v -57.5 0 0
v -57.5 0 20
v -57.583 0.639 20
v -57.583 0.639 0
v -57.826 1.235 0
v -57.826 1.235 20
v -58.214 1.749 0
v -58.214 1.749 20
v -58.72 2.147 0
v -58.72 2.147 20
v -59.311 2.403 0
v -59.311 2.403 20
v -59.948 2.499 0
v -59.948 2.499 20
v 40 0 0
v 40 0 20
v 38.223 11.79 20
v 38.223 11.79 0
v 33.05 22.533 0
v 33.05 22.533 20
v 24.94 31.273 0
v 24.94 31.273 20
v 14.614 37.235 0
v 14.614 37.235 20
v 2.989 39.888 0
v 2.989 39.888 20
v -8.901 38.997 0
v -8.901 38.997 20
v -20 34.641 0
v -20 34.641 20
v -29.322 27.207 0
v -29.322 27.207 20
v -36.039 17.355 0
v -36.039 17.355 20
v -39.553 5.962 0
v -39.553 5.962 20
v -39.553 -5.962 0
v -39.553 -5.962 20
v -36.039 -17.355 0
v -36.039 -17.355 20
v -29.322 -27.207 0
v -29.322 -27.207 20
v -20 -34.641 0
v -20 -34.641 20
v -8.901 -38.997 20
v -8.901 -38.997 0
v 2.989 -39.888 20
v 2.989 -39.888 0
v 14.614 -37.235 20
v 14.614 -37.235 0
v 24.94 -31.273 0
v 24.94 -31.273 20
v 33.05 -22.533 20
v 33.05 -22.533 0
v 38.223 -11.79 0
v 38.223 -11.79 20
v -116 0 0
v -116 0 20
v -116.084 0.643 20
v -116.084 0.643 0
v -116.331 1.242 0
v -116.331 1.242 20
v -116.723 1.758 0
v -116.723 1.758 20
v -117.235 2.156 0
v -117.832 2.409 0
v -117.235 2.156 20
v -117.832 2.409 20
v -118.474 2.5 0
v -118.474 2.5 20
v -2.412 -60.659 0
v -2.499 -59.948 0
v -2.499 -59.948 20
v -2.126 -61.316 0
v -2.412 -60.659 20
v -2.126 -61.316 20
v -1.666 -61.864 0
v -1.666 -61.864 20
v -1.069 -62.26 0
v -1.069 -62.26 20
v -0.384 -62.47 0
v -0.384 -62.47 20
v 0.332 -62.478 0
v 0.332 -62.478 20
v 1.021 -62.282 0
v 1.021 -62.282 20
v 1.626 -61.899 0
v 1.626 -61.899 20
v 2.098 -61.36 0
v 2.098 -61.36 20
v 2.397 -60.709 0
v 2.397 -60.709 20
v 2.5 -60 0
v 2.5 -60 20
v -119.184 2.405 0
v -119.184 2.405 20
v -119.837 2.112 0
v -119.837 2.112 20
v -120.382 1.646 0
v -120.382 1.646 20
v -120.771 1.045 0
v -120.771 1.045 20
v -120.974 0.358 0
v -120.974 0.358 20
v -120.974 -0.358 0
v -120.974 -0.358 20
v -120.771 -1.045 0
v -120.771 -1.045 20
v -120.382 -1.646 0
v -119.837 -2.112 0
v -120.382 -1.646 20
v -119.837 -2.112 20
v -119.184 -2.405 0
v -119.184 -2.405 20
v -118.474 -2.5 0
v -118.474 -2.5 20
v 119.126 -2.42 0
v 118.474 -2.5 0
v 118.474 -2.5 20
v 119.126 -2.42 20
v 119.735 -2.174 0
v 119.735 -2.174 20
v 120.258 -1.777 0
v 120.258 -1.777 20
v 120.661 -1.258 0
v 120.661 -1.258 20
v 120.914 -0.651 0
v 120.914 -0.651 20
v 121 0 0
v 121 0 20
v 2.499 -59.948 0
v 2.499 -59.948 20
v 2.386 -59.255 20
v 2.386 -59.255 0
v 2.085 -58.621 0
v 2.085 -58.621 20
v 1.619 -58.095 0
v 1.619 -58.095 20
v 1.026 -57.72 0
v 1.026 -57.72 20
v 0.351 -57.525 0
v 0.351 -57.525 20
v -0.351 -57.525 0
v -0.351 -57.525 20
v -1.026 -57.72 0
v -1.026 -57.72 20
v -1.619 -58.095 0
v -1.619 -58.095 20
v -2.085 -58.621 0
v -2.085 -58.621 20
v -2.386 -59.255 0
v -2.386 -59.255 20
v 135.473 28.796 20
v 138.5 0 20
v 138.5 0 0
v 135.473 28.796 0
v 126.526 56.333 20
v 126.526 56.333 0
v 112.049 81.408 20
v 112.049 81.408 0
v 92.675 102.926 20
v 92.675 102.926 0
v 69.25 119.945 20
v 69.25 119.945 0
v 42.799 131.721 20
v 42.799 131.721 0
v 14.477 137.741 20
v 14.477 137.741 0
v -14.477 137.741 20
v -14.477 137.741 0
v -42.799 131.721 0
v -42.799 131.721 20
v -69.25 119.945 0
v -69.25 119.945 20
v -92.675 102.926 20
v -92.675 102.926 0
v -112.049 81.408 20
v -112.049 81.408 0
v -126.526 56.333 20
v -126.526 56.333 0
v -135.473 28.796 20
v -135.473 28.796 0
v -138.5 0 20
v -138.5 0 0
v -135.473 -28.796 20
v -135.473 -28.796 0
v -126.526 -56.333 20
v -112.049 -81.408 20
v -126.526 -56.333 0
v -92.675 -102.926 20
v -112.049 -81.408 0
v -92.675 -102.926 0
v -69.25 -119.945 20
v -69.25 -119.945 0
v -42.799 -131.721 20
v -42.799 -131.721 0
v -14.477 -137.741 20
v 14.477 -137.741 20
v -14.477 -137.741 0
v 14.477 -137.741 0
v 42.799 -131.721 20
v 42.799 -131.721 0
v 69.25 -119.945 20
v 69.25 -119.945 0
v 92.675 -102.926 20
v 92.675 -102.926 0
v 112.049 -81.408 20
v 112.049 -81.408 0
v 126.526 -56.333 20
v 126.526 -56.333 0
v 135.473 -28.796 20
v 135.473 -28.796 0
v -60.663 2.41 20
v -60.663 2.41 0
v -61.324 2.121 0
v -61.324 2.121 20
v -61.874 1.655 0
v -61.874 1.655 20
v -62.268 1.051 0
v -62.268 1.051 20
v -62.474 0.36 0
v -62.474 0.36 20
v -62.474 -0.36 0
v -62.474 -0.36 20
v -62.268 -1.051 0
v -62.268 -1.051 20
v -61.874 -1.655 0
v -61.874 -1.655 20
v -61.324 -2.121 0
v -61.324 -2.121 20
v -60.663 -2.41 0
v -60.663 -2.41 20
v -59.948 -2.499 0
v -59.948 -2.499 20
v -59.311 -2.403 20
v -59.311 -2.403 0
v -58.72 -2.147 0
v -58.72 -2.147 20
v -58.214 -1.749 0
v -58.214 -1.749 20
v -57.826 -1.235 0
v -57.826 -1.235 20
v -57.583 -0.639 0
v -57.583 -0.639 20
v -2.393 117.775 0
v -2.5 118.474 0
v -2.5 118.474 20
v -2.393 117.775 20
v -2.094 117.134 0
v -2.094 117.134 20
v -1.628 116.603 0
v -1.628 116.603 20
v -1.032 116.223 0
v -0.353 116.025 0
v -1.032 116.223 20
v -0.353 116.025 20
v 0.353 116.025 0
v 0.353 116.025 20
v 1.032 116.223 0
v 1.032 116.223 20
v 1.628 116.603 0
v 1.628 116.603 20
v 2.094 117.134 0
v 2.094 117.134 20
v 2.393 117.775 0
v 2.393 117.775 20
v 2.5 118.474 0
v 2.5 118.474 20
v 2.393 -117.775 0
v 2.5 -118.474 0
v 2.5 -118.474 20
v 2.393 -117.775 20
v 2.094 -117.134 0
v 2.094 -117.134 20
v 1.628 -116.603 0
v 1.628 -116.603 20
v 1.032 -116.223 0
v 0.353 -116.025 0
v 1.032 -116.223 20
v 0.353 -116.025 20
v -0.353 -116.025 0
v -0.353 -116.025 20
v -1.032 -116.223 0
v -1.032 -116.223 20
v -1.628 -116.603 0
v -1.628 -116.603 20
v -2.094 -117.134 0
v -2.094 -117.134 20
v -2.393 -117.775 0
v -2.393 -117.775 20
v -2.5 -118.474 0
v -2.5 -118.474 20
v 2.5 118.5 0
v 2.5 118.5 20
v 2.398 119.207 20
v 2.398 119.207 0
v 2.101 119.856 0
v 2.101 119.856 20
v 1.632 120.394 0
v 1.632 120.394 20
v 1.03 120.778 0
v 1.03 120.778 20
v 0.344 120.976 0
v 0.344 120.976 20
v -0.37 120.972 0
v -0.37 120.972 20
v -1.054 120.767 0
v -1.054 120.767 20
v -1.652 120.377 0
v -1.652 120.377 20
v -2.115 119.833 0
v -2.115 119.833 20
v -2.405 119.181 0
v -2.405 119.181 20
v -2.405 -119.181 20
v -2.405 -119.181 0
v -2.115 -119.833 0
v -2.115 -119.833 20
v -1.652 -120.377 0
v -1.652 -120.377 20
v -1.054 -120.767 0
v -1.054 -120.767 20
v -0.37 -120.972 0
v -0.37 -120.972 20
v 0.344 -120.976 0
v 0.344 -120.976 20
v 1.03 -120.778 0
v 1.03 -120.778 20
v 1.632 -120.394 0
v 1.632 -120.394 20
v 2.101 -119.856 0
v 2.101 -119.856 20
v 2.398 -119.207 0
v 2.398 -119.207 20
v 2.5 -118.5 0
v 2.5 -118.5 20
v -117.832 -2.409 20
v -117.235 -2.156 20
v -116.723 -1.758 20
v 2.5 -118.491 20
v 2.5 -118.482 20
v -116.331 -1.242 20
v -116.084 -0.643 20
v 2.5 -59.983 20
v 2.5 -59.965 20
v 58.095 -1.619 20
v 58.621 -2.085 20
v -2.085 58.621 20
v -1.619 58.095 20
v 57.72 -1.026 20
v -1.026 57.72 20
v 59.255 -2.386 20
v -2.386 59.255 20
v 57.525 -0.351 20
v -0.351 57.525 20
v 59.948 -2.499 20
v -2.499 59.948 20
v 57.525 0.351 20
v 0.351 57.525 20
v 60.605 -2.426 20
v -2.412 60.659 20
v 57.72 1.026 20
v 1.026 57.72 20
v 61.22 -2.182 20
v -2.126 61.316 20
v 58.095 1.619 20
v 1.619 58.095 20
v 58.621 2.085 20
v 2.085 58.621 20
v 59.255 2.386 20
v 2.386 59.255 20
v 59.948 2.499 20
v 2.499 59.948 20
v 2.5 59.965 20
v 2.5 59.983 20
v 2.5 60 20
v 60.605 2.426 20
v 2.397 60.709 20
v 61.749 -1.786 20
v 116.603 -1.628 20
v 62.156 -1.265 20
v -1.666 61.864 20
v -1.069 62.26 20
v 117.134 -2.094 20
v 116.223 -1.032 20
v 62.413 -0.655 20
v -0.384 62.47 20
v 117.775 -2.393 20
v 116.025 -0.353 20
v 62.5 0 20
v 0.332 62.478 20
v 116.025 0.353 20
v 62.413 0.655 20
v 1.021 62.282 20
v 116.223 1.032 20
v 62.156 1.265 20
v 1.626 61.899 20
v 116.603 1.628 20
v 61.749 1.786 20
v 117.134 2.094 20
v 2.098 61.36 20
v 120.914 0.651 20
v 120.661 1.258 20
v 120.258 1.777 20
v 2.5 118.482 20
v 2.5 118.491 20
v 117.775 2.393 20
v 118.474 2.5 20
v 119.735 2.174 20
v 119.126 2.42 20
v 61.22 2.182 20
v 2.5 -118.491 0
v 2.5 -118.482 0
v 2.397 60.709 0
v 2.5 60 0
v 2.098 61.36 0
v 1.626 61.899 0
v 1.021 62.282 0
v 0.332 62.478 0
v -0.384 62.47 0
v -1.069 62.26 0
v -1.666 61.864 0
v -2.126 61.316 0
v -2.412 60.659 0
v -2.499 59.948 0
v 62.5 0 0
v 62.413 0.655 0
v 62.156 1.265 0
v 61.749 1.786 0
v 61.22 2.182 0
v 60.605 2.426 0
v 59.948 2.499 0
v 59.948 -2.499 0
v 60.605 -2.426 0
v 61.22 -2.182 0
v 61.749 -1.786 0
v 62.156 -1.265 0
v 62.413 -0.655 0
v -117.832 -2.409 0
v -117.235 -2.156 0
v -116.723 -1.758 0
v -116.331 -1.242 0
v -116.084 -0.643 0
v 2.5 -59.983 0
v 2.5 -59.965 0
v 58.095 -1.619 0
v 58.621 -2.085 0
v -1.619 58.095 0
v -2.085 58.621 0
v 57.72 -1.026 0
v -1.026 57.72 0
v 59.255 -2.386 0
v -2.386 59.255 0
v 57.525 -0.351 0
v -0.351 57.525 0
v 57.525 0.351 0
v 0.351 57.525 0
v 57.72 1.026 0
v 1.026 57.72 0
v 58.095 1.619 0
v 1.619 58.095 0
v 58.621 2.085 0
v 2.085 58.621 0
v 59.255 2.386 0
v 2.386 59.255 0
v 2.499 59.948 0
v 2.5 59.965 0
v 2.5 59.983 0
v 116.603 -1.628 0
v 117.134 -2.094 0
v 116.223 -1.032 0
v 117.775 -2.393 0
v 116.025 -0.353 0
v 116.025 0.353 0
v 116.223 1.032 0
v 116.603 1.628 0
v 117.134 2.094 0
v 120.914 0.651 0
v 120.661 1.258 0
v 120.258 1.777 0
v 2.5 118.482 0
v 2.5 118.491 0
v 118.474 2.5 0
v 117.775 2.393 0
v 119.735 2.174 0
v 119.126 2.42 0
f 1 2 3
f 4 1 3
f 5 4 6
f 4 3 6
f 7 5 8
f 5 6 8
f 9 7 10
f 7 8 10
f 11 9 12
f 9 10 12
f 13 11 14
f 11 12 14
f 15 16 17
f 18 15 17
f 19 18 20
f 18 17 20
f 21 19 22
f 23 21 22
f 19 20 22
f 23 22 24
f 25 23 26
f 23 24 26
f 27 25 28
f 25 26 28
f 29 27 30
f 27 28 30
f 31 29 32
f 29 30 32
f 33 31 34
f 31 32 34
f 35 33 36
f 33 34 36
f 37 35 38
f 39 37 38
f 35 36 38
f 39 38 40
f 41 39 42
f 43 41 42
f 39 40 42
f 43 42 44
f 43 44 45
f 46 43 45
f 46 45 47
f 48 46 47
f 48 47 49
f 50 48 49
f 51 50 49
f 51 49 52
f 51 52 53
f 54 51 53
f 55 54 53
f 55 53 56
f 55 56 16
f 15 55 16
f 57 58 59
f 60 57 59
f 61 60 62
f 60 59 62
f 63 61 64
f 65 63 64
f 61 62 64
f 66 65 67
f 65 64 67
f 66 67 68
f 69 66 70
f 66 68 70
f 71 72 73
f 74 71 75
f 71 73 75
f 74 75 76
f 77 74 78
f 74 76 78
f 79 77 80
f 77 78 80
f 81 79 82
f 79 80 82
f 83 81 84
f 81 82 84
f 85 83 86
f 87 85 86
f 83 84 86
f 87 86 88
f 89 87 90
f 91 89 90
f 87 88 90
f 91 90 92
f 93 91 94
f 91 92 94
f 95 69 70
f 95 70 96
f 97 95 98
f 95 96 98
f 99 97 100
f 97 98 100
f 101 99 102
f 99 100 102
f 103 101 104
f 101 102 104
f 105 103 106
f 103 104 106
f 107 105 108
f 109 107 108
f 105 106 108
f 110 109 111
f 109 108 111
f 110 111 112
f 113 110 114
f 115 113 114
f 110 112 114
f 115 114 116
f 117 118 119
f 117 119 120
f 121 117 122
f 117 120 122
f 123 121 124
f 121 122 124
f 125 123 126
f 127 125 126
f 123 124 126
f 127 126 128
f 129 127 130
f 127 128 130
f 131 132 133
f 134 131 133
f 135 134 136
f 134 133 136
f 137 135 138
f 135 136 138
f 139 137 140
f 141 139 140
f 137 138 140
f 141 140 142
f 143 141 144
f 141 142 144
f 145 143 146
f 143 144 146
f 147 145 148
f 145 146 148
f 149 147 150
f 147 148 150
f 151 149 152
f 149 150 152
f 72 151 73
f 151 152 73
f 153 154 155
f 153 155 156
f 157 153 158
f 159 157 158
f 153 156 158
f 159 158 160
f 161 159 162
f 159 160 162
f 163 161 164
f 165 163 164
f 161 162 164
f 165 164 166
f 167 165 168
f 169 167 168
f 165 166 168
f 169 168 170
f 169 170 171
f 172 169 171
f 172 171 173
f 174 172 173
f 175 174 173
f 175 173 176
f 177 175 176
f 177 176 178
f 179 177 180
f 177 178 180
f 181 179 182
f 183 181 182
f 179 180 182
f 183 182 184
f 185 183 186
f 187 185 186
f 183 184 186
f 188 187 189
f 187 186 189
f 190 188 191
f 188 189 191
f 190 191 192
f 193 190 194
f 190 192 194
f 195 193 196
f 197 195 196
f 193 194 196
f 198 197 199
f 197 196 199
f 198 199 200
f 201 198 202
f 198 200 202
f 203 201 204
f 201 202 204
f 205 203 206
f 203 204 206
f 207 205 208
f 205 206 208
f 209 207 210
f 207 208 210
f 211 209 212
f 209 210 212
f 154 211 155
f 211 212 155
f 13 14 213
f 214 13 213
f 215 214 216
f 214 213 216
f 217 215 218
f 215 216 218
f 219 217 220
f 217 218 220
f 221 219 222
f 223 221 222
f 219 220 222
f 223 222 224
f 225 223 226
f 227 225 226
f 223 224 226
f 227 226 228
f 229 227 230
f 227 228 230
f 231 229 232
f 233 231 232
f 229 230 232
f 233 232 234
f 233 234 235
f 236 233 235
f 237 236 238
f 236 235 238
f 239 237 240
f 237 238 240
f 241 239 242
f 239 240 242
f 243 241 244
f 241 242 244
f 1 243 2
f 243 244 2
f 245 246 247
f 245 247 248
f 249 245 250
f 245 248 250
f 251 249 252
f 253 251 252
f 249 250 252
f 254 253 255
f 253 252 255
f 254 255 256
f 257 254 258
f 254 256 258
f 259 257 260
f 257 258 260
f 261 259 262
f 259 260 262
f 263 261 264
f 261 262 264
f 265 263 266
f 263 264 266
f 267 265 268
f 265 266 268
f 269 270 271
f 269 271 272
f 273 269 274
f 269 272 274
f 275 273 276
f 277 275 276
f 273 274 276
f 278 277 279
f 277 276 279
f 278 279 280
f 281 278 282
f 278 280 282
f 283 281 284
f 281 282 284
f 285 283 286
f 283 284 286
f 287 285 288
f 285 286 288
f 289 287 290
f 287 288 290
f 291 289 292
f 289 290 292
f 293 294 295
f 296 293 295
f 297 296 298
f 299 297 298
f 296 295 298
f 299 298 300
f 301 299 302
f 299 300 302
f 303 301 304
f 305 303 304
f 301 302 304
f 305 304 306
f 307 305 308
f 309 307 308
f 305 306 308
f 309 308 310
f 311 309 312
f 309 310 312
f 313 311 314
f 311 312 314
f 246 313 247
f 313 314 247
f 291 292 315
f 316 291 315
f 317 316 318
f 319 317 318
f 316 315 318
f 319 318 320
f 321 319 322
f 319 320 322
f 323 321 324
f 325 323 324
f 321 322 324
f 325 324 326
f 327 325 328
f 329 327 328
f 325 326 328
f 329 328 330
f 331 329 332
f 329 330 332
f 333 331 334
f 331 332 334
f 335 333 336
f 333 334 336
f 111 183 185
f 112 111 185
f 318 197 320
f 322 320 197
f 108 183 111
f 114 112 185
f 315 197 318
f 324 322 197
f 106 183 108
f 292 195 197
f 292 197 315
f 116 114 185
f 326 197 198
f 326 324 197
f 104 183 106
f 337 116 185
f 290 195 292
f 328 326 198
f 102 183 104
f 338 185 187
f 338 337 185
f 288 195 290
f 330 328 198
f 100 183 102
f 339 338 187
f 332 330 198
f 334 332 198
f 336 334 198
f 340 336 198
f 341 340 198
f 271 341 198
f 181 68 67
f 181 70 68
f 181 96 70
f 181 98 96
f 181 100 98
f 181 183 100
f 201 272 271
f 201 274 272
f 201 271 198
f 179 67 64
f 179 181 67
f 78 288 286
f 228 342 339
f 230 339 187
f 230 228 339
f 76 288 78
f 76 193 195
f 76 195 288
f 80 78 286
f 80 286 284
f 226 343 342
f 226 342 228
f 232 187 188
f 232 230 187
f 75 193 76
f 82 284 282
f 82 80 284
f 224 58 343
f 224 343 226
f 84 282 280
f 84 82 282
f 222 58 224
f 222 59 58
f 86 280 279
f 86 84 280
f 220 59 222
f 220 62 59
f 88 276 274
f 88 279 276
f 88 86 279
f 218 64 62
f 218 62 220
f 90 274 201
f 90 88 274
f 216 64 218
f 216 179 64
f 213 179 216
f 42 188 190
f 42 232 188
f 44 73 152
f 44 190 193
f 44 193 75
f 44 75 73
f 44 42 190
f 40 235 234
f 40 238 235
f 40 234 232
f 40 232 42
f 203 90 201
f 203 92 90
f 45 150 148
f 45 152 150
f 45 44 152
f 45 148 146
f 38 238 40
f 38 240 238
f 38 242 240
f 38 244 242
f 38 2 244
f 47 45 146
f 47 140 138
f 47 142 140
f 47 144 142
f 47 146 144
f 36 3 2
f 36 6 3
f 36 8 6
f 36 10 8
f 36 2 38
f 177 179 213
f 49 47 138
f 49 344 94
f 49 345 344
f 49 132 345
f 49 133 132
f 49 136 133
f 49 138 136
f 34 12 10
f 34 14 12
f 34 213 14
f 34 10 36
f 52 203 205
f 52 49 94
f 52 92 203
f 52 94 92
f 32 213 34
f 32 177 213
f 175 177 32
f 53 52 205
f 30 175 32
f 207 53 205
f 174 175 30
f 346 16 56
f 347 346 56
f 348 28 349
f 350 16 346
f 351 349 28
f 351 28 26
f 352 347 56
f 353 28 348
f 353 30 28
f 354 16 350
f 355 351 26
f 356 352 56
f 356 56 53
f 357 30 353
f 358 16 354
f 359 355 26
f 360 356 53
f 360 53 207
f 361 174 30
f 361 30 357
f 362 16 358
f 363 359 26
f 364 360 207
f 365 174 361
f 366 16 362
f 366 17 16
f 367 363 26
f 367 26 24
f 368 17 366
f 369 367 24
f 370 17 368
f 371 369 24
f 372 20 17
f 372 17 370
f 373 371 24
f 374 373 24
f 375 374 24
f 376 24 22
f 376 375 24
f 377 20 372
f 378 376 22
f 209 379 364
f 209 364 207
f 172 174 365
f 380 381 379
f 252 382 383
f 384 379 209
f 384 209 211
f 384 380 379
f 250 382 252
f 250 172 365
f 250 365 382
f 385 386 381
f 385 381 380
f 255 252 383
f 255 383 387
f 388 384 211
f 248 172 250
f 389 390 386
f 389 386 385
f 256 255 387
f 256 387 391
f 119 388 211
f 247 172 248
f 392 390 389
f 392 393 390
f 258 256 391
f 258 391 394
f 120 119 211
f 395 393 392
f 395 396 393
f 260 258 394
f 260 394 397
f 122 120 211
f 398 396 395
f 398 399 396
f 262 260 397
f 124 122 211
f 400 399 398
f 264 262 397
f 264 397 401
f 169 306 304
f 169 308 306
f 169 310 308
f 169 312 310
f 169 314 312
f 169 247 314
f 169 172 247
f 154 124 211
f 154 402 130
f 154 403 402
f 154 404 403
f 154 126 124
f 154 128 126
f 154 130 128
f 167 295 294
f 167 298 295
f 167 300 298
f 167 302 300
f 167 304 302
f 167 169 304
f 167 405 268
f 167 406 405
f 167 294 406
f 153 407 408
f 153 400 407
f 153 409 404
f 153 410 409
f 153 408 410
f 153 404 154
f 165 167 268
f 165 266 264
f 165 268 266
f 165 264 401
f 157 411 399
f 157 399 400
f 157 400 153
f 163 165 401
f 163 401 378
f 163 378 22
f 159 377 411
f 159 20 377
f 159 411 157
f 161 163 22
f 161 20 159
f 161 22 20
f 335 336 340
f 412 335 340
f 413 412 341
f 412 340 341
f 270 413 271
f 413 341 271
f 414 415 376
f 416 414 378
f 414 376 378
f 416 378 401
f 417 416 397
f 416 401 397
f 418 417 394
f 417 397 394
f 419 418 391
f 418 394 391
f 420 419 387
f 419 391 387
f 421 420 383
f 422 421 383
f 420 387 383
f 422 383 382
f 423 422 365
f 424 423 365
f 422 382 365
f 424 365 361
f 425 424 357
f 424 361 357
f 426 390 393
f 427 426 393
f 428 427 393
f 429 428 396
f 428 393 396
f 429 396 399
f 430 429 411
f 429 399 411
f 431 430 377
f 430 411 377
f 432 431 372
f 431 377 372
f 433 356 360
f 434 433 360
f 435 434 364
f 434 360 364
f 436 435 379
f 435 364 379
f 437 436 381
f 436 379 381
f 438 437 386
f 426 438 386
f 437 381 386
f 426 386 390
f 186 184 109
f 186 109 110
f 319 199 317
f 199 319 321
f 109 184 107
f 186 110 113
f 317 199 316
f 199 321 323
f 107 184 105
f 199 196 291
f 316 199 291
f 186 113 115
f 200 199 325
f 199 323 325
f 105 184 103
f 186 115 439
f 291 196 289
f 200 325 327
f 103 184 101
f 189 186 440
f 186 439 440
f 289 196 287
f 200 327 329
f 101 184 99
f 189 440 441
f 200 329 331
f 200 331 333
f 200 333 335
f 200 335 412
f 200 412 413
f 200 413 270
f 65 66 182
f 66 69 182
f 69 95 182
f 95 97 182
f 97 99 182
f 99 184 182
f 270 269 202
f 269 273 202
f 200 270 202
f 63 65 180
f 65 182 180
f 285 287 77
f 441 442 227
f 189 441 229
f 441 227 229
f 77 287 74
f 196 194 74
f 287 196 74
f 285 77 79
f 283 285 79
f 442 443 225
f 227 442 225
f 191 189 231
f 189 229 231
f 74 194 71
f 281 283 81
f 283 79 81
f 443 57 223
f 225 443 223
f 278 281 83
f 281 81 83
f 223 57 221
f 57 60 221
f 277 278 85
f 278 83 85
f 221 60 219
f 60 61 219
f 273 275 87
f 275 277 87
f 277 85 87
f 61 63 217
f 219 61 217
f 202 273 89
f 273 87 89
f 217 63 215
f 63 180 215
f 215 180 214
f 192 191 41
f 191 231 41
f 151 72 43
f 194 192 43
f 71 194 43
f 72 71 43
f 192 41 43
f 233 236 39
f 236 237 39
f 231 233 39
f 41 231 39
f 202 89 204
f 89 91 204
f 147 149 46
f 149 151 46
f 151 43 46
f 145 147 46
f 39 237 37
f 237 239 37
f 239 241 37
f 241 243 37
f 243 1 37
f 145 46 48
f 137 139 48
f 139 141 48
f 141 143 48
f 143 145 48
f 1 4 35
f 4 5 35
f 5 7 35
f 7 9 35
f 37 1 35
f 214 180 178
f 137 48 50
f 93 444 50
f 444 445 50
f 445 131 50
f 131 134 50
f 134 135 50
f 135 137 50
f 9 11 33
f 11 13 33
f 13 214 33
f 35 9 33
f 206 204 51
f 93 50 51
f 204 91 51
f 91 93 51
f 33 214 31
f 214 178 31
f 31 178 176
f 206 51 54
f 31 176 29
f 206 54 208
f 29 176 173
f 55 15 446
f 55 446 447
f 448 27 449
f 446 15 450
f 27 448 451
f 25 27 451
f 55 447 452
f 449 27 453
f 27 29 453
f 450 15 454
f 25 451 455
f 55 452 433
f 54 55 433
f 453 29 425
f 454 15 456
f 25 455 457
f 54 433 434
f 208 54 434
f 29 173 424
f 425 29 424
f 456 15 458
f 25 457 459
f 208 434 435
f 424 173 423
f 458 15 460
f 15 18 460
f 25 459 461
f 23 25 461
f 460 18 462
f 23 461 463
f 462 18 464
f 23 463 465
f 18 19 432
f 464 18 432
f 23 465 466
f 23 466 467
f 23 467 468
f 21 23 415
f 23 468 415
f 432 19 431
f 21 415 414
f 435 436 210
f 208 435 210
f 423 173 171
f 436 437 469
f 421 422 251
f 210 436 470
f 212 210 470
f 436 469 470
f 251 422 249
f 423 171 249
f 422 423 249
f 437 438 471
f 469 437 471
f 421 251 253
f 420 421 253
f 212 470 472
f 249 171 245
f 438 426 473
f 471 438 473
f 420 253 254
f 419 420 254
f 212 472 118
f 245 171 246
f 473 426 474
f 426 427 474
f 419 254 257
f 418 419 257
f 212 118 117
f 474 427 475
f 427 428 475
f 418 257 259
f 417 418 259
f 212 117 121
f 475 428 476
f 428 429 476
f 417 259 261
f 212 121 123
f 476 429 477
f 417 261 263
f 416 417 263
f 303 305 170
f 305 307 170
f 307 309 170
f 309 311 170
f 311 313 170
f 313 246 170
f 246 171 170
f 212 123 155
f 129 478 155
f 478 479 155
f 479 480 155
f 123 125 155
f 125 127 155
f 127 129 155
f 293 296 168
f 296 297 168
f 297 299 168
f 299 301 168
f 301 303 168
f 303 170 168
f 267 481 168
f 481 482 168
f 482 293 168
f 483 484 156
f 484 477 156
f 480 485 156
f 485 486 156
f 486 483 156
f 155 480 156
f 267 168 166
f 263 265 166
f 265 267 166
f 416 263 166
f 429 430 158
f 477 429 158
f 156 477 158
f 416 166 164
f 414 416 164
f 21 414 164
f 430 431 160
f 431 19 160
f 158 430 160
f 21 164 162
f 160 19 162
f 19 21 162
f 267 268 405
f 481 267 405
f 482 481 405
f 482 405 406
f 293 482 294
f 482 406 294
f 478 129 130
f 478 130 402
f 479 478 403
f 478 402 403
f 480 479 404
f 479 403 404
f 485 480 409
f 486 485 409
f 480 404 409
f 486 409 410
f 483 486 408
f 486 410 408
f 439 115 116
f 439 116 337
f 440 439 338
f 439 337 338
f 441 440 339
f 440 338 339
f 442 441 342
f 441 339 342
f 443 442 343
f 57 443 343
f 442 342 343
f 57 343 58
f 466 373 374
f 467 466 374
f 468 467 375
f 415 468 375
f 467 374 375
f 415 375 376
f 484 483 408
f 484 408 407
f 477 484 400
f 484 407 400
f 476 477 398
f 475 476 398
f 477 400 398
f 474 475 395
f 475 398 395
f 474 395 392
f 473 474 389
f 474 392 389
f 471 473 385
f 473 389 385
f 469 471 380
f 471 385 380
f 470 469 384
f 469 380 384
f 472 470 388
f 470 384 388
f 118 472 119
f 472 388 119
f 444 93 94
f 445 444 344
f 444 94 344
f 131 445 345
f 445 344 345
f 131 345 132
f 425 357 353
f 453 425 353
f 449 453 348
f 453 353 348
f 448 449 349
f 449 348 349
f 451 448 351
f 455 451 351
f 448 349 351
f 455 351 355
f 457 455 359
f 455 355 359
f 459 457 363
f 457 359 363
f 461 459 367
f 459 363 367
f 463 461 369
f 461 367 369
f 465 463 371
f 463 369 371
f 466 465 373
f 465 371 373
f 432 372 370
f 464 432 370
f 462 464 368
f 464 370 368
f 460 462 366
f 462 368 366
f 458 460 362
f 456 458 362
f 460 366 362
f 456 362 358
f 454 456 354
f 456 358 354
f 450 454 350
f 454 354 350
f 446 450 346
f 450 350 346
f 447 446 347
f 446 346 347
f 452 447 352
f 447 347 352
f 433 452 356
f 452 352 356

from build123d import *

# Parameters (mm, degrees)
F0_R     = 138.5
F1_DEPTH = 20
F2_R     = 40
F3_DEPTH = 25
F5_DEPTH = 25
F7_DEPTH = 20.001


with BuildPart() as f1:
    # F0 (on Top) → F1 (new body)
    with BuildSketch(Plane.XY):
        Circle(F0_R)
    extrude(amount=F1_DEPTH)

    # F2 (on face) → F3 (cut)
    with BuildSketch(Plane.XY.offset(20)):
        Circle(F2_R)
    extrude(amount=-F3_DEPTH, mode=Mode.SUBTRACT)

    # F4 (on face) → F5 (cut)
    with BuildSketch(Plane.XY.offset(20)):
        with BuildLine():
            ThreePointArc((-2.4994574064, 59.9479166667), (0, 60), (2.4994574064, 59.9479166667))
            ThreePointArc((2.4994574064, 59.9479166667), (2.4998643479, 59.9739569202), (2.5, 60))
            ThreePointArc((2.5, 60), (-0.0260430798, 62.4998643479), (-2.4994574064, 59.9479166667))
        make_face()
        with BuildLine():
            ThreePointArc((-2.4994574064, 59.9479166667), (0, 57.5), (2.4994574064, 59.9479166667))
            ThreePointArc((2.4994574064, 59.9479166667), (0, 60), (-2.4994574064, 59.9479166667))
        make_face()
        with BuildLine():
            ThreePointArc((-57.5, 0), (-58.2139137292, 1.7492557941), (-59.9479166667, 2.4994574064))
            ThreePointArc((-59.9479166667, 2.4994574064), (-60, 0), (-59.9479166667, -2.4994574064))
            ThreePointArc((-59.9479166667, -2.4994574064), (-58.2139137292, -1.7492557941), (-57.5, 0))
        make_face()
        with BuildLine():
            ThreePointArc((-59.9479166667, -2.4994574064), (-60, 0), (-59.9479166667, 2.4994574064))
            ThreePointArc((-59.9479166667, 2.4994574064), (-62.5, 0), (-59.9479166667, -2.4994574064))
        make_face()
        with BuildLine():
            ThreePointArc((59.9479166667, 2.4994574064), (59.9869777535, 1.25), (60, 0))
            ThreePointArc((60, 0), (59.9869777535, -1.25), (59.9479166667, -2.4994574064))
            ThreePointArc((59.9479166667, -2.4994574064), (61.7492557941, -1.7860862708), (62.5, 0))
            ThreePointArc((62.5, 0), (61.7492557941, 1.7860862708), (59.9479166667, 2.4994574064))
        make_face()
        with BuildLine():
            ThreePointArc((59.9479166667, -2.4994574064), (59.9869777535, -1.25), (60, 0))
            ThreePointArc((60, 0), (59.9869777535, 1.25), (59.9479166667, 2.4994574064))
            ThreePointArc((59.9479166667, 2.4994574064), (57.5, 0), (59.9479166667, -2.4994574064))
        make_face()
        with BuildLine():
            ThreePointArc((2.5, -60), (2.4998643479, -59.9739569202), (2.4994574064, -59.9479166667))
            ThreePointArc((2.4994574064, -59.9479166667), (0, -60), (-2.4994574064, -59.9479166667))
            ThreePointArc((-2.4994574064, -59.9479166667), (-0.0260430798, -62.4998643479), (2.5, -60))
        make_face()
        with BuildLine():
            ThreePointArc((-2.4994574064, -59.9479166667), (0, -60), (2.4994574064, -59.9479166667))
            ThreePointArc((2.4994574064, -59.9479166667), (0, -57.5), (-2.4994574064, -59.9479166667))
        make_face()
    extrude(amount=-F5_DEPTH, mode=Mode.SUBTRACT)

    # F6 (on face) → F7 (cut, through all)
    with BuildSketch(Plane.XY.offset(20)):
        with BuildLine():
            ThreePointArc((-2.499860907, 118.473628692), (0, 118.5), (2.499860907, 118.473628692))
            ThreePointArc((2.499860907, 118.473628692), (2.4999652265, 118.4868141626), (2.5, 118.5))
            ThreePointArc((2.5, 118.5), (-0.0131858374, 120.9999652265), (-2.499860907, 118.473628692))
        make_face()
        with BuildLine():
            ThreePointArc((-2.499860907, 118.473628692), (0, 116), (2.499860907, 118.473628692))
            ThreePointArc((2.499860907, 118.473628692), (0, 118.5), (-2.499860907, 118.473628692))
        make_face()
        with BuildLine():
            ThreePointArc((-116, 0), (-116.7229338406, 1.7584185693), (-118.473628692, 2.499860907))
            ThreePointArc((-118.473628692, 2.499860907), (-118.5, 0), (-118.473628692, -2.499860907))
            ThreePointArc((-118.473628692, -2.499860907), (-116.7229338406, -1.7584185693), (-116, 0))
        make_face()
        with BuildLine():
            ThreePointArc((-118.473628692, -2.499860907), (-118.5, 0), (-118.473628692, 2.499860907))
            ThreePointArc((-118.473628692, 2.499860907), (-121, 0), (-118.473628692, -2.499860907))
        make_face()
        with BuildLine():
            ThreePointArc((-2.499860907, -118.473628692), (0, -118.5), (2.499860907, -118.473628692))
            ThreePointArc((2.499860907, -118.473628692), (0, -116), (-2.499860907, -118.473628692))
        make_face()
        with BuildLine():
            ThreePointArc((2.5, -118.5), (2.4999652265, -118.4868141626), (2.499860907, -118.473628692))
            ThreePointArc((2.499860907, -118.473628692), (0, -118.5), (-2.499860907, -118.473628692))
            ThreePointArc((-2.499860907, -118.473628692), (-0.0131858374, -120.9999652265), (2.5, -118.5))
        make_face()
        with BuildLine():
            ThreePointArc((118.473628692, -2.499860907), (118.4934069896, -1.25), (118.5, 0))
            ThreePointArc((118.5, 0), (118.4934069896, 1.25), (118.473628692, 2.499860907))
            ThreePointArc((118.473628692, 2.499860907), (116, 0), (118.473628692, -2.499860907))
        make_face()
        with BuildLine():
            ThreePointArc((118.473628692, 2.499860907), (118.4934069896, 1.25), (118.5, 0))
            ThreePointArc((118.5, 0), (118.4934069896, -1.25), (118.473628692, -2.499860907))
            ThreePointArc((118.473628692, -2.499860907), (120.2584185693, -1.7770661594), (121, 0))
            ThreePointArc((121, 0), (120.2584185693, 1.7770661594), (118.473628692, 2.499860907))
        make_face()
    extrude(amount=-F7_DEPTH, mode=Mode.SUBTRACT)


solid = f1.part
